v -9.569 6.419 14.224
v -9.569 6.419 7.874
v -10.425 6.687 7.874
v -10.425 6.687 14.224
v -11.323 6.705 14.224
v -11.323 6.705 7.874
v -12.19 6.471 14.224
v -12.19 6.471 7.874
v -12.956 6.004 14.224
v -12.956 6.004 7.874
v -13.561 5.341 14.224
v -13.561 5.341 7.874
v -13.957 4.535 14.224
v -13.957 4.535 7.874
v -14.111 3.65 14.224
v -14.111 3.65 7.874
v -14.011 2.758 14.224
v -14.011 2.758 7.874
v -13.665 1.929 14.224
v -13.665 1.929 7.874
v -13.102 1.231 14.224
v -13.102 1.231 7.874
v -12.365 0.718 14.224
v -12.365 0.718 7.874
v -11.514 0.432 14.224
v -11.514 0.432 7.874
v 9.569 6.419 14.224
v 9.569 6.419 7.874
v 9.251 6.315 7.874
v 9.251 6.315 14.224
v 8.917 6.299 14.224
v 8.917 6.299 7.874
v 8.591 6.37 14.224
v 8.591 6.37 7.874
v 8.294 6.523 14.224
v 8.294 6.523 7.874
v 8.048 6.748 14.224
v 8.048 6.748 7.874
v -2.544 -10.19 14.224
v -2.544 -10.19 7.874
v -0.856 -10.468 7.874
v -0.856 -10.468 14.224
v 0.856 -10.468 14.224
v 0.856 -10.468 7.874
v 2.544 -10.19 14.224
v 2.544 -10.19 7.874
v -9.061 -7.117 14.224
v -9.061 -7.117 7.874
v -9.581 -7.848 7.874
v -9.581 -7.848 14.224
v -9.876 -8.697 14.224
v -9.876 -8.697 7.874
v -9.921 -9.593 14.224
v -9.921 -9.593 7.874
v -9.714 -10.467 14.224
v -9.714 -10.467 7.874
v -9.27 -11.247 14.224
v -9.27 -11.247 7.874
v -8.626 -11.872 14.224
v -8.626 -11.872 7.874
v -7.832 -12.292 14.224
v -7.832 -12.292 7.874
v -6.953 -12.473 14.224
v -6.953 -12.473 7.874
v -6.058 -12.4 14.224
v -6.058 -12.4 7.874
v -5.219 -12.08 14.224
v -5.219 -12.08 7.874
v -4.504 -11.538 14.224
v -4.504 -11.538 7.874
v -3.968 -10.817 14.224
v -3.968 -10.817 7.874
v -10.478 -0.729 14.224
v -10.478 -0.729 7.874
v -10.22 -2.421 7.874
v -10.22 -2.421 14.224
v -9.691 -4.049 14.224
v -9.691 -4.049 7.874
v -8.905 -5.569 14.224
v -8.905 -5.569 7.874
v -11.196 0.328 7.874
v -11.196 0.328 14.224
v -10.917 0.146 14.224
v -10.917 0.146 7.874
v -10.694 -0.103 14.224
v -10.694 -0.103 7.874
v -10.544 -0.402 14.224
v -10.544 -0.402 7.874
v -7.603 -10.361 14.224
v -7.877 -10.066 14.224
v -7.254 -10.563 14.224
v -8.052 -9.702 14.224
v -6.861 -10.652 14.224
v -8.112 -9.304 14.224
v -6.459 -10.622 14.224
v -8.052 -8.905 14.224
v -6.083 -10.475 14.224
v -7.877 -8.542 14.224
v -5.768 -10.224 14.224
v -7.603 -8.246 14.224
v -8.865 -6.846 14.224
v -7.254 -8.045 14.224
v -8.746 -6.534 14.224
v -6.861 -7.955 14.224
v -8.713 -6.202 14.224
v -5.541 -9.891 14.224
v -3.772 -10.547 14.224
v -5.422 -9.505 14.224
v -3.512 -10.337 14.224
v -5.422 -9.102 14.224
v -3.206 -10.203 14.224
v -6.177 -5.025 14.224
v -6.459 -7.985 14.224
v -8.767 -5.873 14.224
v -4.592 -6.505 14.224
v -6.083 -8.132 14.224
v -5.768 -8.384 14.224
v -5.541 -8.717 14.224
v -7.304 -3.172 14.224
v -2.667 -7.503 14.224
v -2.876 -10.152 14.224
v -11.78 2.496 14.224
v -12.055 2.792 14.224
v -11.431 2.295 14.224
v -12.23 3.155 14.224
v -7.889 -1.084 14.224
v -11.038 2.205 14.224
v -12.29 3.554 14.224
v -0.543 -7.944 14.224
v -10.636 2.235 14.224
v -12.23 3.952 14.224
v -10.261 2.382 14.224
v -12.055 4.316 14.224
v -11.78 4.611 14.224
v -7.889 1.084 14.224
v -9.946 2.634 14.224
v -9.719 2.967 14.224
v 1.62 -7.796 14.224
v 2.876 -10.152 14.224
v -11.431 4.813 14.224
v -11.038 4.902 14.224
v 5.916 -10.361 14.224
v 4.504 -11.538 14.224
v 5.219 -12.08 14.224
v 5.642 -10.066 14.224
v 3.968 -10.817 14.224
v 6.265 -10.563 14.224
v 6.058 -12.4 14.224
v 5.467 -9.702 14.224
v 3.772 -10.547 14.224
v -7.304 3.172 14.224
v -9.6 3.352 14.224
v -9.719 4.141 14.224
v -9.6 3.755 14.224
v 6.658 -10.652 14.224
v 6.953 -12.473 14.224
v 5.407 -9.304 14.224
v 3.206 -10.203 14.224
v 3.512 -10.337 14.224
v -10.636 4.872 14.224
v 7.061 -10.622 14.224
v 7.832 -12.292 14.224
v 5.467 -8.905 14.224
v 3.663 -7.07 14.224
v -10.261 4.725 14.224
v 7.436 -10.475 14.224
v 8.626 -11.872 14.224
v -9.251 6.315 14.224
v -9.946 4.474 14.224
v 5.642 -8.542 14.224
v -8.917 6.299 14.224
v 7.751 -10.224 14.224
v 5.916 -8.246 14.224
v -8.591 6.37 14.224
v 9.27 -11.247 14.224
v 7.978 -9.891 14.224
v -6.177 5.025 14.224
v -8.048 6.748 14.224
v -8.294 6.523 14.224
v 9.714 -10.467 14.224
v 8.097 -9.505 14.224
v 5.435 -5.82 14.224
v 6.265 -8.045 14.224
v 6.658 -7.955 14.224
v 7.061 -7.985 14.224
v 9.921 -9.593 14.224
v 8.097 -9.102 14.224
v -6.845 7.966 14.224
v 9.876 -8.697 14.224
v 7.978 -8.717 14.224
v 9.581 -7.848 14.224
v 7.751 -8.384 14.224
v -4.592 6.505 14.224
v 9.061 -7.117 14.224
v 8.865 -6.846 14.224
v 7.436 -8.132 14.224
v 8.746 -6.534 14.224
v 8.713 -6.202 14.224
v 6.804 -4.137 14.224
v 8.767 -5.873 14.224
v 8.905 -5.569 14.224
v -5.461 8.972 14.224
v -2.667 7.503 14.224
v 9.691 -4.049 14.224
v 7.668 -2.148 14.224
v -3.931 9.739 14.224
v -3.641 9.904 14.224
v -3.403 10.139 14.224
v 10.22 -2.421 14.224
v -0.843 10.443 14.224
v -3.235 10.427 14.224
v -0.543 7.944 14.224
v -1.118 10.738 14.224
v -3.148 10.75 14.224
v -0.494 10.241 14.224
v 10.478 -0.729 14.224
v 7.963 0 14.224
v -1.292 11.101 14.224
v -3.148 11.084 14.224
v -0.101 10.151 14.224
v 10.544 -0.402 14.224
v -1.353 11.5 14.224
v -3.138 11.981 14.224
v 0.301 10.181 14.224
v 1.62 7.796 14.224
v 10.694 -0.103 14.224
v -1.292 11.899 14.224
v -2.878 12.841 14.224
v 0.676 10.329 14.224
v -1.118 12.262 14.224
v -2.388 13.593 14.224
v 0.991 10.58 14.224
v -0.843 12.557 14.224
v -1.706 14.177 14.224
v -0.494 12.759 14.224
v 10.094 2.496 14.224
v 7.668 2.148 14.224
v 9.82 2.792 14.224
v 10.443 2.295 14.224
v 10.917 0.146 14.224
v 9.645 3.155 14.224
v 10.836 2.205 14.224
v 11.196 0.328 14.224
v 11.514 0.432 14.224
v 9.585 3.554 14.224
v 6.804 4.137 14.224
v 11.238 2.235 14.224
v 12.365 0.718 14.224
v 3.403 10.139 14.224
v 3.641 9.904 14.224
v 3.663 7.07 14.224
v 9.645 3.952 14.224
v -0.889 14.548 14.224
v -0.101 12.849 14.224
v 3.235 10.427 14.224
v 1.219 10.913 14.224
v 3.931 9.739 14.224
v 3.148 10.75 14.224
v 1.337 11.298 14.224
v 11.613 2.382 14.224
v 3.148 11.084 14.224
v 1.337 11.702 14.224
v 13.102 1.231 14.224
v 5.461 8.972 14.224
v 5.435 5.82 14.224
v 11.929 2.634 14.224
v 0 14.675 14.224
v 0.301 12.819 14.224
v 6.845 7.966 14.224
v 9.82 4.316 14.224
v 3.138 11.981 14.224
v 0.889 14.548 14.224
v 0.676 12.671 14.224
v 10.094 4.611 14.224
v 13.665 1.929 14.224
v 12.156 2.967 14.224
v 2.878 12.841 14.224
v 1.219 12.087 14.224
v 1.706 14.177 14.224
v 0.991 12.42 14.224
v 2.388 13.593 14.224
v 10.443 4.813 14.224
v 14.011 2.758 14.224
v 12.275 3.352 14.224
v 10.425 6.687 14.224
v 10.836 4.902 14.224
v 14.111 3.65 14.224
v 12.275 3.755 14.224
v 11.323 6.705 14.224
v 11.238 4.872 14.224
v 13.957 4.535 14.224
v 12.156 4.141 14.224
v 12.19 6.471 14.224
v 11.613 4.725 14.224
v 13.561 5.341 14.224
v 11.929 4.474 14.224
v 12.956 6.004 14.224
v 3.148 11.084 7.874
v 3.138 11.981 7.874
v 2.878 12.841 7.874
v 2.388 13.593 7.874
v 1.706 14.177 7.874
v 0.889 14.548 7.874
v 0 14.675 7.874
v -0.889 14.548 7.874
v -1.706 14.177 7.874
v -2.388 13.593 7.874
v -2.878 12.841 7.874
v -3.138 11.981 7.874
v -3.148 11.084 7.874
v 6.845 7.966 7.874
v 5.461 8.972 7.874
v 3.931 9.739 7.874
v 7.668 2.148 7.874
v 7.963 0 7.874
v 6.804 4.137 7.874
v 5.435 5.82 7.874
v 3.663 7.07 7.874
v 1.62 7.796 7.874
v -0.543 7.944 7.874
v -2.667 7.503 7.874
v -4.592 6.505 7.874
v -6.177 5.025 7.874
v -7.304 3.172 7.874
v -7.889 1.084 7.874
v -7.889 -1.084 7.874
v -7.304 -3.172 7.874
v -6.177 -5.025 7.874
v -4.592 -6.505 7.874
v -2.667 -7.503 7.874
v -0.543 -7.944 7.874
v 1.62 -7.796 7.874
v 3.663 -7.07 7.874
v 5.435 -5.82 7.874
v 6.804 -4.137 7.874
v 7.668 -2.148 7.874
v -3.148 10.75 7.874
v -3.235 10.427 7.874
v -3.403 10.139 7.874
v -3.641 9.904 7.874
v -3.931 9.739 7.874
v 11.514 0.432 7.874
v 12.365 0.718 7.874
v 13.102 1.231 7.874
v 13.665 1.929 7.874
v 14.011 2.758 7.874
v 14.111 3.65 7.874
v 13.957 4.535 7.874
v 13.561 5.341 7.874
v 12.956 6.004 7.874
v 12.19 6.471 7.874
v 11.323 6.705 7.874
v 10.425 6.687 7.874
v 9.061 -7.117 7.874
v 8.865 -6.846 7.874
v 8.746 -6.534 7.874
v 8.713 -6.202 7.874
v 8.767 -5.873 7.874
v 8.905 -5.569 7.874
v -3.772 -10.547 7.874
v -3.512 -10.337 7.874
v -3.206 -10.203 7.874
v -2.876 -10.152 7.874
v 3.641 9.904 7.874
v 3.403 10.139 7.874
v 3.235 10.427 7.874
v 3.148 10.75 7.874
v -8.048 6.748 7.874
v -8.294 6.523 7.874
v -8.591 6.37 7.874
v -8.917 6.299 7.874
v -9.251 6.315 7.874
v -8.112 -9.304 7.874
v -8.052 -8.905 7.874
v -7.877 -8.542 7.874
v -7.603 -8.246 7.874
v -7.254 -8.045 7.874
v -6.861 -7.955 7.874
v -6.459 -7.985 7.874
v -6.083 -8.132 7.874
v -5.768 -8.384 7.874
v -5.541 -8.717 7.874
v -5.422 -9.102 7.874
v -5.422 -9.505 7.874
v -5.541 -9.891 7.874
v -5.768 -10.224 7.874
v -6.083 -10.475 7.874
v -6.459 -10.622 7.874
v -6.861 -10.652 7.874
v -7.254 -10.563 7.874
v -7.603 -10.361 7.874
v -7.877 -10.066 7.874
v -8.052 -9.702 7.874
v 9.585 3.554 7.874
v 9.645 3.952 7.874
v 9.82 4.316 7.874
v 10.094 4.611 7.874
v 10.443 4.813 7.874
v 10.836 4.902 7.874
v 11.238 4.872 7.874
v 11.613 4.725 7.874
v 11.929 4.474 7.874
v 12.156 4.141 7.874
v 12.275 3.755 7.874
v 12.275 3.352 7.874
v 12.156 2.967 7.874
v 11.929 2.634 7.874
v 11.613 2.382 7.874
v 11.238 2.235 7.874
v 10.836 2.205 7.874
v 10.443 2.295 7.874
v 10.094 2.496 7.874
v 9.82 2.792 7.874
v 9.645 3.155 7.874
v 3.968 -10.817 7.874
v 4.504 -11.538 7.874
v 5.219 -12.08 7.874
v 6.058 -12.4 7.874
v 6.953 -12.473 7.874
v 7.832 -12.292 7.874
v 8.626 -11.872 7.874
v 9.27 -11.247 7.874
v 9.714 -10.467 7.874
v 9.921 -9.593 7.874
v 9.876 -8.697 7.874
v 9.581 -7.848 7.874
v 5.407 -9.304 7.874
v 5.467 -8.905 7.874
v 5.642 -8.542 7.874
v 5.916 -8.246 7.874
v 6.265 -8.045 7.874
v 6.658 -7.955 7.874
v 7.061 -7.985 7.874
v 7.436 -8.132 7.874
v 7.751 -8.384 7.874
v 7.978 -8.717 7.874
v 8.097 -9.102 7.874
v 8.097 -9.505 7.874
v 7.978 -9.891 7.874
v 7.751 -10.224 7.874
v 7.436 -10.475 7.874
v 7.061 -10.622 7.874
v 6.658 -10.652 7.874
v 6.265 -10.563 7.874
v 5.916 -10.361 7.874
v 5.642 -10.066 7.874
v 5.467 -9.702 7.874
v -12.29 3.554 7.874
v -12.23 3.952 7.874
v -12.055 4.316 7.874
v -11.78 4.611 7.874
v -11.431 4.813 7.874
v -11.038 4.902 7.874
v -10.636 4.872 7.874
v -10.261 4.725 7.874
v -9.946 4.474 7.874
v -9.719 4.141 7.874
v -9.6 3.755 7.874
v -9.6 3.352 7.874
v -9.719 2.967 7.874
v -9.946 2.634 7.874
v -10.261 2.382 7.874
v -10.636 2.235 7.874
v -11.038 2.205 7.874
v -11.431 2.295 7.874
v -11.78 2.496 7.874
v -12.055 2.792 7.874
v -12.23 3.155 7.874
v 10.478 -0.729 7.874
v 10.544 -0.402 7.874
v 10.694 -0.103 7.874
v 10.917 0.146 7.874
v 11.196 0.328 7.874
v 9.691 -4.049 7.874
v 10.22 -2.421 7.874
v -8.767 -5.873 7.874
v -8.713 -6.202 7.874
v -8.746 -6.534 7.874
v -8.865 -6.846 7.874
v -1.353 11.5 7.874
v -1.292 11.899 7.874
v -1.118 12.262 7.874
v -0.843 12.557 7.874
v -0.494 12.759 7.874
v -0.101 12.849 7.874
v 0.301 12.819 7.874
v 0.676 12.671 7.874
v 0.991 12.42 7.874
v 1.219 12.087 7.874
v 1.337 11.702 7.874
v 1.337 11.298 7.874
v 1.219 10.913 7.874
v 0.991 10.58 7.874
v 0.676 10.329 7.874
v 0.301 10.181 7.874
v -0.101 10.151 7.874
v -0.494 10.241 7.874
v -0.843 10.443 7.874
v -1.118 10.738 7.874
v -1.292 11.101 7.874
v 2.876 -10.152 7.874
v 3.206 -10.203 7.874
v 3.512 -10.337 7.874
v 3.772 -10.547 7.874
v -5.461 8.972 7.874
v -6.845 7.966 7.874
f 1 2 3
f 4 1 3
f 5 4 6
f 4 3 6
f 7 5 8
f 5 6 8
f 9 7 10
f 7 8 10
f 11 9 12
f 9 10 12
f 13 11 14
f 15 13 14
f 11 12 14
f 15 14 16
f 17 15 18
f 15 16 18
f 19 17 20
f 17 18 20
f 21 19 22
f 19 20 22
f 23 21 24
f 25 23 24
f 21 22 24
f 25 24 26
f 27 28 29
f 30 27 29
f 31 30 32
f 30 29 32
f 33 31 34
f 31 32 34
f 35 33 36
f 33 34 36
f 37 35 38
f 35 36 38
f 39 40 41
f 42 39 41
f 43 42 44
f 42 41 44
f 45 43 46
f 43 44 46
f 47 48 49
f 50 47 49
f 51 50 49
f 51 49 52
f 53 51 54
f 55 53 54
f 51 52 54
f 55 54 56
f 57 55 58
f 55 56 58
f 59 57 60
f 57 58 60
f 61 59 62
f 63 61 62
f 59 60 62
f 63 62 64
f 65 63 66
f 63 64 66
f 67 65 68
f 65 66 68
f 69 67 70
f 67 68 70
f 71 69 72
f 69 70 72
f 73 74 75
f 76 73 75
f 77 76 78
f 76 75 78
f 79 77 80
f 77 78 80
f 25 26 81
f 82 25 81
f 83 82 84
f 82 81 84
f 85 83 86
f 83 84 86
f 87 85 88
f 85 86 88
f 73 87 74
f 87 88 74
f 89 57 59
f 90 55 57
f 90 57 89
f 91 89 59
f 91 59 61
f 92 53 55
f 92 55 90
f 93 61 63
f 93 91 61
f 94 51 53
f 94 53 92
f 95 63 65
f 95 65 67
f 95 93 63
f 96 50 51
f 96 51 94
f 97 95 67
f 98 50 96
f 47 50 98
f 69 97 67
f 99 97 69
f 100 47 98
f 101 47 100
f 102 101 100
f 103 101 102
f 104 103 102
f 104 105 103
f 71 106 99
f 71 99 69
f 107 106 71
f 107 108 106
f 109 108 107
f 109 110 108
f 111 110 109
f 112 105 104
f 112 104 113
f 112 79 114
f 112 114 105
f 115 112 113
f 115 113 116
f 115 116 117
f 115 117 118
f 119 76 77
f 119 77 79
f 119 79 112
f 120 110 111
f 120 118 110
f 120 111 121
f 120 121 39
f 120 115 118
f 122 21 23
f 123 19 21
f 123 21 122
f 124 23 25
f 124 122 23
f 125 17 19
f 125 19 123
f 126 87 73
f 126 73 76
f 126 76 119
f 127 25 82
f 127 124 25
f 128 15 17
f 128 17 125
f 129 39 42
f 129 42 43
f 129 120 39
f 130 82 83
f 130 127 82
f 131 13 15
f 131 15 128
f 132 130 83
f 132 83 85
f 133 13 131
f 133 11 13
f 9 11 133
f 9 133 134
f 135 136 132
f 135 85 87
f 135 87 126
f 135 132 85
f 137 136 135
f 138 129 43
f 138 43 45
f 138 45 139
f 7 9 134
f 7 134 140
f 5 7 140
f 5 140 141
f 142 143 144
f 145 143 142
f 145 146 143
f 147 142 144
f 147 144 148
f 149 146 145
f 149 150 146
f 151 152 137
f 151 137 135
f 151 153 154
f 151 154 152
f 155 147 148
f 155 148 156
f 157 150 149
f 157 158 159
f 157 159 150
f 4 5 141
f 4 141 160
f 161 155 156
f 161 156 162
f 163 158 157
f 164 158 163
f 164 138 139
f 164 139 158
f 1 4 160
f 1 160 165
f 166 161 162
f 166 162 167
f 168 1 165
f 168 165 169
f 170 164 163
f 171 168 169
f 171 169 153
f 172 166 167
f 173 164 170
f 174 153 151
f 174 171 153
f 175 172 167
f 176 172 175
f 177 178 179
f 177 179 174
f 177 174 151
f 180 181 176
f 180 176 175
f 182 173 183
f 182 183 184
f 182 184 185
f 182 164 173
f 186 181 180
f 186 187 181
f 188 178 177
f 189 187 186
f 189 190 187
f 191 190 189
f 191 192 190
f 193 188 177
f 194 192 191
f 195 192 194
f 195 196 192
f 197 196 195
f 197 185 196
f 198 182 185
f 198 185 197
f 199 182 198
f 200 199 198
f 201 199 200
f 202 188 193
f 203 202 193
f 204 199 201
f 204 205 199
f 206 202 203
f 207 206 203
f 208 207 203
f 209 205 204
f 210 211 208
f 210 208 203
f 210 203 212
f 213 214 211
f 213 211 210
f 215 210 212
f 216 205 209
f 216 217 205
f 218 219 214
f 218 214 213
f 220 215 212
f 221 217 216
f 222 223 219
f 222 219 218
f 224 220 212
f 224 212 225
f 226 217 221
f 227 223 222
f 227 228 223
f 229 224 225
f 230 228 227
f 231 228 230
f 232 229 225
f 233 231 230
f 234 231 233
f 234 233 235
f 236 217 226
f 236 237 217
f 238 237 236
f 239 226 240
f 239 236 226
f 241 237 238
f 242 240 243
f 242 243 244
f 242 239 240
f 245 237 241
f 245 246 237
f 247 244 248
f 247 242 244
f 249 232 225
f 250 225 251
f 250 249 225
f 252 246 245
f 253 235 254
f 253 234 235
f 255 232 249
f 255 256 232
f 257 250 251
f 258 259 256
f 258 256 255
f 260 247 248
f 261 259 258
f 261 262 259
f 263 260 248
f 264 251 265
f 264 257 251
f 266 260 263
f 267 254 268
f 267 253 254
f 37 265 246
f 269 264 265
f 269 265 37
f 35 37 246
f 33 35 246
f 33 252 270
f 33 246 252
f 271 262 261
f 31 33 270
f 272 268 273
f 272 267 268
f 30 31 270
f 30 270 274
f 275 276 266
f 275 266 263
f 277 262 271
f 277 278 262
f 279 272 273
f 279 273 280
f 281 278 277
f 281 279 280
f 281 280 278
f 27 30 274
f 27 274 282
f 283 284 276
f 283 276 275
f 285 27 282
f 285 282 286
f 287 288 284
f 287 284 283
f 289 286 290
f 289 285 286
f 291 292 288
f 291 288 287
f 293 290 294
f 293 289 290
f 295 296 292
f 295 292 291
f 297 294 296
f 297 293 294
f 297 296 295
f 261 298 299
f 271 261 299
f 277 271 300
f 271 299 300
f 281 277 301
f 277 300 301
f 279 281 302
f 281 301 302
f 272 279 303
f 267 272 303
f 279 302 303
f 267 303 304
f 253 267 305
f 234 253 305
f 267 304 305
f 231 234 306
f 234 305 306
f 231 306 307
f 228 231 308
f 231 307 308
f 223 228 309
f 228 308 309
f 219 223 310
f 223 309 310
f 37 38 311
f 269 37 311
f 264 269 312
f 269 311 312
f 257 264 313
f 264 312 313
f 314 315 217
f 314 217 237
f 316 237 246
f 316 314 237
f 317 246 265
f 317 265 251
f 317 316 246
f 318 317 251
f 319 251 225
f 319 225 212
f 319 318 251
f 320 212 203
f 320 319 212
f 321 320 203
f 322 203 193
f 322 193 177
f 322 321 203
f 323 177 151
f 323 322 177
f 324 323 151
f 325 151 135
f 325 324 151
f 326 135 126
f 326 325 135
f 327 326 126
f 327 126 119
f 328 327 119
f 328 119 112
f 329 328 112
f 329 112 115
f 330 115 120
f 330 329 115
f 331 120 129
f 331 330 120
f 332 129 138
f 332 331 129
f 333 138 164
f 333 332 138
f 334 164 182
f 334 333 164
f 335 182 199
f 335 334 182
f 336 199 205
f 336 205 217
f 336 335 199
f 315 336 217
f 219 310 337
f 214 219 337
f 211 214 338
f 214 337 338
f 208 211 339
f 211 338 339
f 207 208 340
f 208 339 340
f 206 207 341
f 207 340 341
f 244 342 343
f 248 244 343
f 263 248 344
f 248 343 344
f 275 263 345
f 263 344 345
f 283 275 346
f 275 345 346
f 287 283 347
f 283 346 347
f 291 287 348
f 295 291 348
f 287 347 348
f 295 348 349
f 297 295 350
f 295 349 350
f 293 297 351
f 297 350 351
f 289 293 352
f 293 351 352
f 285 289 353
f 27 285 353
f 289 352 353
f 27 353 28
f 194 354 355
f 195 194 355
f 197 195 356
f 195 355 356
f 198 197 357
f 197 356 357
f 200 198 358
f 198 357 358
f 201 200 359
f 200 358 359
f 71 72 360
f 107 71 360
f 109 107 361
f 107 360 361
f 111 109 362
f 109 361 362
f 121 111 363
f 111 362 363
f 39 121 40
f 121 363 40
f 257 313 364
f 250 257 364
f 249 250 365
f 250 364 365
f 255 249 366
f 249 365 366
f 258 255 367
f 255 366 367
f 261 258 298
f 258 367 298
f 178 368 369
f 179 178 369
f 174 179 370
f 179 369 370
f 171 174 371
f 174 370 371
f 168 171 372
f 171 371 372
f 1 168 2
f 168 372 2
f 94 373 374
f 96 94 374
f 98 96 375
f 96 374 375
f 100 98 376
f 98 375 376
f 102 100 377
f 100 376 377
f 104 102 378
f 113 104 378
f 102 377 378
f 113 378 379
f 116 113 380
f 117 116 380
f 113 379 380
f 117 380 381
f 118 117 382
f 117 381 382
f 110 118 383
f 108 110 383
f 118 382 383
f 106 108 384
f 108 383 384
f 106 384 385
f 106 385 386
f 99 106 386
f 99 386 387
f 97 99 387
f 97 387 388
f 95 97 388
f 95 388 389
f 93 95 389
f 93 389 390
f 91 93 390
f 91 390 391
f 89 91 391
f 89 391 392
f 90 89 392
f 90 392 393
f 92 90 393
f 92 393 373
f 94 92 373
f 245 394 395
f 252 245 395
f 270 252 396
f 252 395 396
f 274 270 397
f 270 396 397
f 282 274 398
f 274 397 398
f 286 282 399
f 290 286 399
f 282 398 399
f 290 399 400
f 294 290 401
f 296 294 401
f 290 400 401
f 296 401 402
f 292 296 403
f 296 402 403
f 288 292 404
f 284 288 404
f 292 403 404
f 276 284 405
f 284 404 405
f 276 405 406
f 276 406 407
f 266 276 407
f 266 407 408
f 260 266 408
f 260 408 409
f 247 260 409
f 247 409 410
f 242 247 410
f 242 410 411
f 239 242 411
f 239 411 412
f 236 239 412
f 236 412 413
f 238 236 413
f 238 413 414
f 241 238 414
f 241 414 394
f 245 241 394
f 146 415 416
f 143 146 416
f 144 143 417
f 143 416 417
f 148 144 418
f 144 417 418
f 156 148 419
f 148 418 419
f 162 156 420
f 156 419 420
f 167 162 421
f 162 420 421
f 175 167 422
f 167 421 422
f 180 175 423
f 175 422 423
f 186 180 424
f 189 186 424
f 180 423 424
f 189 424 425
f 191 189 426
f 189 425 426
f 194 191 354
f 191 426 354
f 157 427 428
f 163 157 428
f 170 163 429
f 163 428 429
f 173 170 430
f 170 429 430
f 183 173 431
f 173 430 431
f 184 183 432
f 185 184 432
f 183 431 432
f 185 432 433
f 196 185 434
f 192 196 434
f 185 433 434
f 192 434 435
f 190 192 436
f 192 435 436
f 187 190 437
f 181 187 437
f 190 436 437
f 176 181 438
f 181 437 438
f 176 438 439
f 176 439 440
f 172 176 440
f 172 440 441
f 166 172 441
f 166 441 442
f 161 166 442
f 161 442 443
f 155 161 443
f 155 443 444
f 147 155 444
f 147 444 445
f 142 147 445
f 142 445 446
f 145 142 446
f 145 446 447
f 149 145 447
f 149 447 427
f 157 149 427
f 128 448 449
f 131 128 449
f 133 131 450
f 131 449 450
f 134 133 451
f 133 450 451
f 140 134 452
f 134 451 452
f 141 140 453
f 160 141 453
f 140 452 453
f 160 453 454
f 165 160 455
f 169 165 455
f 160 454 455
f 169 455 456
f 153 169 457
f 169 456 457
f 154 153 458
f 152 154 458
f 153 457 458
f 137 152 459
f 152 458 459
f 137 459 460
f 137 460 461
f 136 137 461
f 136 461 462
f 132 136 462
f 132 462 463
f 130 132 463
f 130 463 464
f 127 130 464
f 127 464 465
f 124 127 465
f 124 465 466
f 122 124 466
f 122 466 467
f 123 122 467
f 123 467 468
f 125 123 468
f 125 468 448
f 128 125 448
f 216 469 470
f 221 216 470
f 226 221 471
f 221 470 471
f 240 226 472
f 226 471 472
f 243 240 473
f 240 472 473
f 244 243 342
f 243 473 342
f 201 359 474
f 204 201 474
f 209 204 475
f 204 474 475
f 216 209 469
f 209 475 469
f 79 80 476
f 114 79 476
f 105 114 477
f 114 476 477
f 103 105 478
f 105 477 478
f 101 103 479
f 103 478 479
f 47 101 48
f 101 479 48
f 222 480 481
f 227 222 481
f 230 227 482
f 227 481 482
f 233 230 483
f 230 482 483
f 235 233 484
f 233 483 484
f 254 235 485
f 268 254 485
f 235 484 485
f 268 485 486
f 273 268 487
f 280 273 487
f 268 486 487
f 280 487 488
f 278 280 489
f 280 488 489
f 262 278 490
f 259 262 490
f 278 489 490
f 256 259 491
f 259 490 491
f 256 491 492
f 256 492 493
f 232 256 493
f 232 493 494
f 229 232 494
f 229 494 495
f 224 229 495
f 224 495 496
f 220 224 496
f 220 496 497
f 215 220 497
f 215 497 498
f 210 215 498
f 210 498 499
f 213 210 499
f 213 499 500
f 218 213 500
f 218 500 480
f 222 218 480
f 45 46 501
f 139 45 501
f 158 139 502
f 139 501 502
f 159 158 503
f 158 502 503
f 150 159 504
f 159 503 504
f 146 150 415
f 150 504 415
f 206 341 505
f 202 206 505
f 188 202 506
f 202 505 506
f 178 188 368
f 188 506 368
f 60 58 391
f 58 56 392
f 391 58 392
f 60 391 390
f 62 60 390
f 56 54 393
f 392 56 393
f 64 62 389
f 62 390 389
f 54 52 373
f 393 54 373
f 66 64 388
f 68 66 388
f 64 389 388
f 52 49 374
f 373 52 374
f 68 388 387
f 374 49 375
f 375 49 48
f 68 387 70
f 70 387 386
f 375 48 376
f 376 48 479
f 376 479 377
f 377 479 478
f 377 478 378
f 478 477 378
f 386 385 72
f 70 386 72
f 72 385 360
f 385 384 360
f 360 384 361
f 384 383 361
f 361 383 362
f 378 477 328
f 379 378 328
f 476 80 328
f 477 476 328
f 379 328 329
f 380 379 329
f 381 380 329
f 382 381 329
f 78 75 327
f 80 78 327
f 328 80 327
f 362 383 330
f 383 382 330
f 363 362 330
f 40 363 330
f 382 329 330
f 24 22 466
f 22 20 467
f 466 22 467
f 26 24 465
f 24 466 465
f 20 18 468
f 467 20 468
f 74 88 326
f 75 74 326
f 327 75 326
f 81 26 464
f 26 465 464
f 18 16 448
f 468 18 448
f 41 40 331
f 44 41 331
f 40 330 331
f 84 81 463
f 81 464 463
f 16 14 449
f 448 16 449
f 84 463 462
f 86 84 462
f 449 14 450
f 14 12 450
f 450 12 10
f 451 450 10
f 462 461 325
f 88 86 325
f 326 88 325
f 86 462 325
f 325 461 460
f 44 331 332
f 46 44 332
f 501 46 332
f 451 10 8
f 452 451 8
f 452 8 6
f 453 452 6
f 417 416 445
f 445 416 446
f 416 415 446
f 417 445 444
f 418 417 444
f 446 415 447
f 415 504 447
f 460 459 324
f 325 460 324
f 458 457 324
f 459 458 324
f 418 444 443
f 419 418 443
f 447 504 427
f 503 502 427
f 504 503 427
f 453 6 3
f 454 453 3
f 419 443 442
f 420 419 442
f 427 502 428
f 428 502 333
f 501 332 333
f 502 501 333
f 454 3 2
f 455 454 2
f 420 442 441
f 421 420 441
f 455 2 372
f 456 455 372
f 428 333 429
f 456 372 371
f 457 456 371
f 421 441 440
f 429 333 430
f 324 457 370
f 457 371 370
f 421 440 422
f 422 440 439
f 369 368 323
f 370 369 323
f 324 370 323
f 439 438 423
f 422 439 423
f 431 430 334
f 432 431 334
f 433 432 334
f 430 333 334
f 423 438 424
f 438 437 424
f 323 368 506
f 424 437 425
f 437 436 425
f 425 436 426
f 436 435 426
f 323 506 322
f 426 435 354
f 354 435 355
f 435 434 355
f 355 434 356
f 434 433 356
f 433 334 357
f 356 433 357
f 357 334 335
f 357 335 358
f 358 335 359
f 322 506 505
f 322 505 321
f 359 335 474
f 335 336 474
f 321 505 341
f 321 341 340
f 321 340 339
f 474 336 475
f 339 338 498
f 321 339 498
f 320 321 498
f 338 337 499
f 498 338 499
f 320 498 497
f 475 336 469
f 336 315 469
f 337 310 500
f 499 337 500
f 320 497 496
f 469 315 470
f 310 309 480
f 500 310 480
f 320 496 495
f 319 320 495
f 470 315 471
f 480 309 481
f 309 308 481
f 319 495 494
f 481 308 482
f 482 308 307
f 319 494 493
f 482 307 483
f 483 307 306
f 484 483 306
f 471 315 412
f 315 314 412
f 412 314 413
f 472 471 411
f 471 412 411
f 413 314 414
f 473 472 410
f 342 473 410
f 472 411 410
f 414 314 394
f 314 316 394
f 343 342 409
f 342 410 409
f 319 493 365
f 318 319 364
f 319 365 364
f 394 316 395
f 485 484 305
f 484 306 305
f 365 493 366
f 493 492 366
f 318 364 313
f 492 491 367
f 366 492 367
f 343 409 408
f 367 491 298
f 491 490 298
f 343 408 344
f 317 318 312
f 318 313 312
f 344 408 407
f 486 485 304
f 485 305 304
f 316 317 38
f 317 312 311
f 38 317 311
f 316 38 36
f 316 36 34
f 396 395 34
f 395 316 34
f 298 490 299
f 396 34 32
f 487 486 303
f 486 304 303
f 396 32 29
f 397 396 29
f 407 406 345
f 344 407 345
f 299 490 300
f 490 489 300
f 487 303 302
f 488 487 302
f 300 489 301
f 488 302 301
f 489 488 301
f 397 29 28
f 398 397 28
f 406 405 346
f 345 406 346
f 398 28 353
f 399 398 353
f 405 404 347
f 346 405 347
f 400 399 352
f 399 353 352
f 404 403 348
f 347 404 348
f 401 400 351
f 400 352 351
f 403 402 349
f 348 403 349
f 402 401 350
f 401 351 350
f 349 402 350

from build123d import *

# Parameters (mm, degrees)
SKETCH1_R             = 7.9629
BOSS_EXTRUDE1_DEPTH   = 6.35
F_6_32_TAPPED_HOLE1_D = 2.7051


with BuildPart() as part:
    # Sketch1 → Boss-Extrude1 (new body)
    with BuildSketch(Plane.XY.offset(7.874)):
        with BuildLine():
            ThreePointArc((8.047909304, 6.74848607), (6.173449726, 8.49702459), (3.931250908, 9.739413469))
            ThreePointArc((3.931250908, 9.739413469), (3.309450684, 10.277458281), (3.147581267, 11.08363818))
            ThreePointArc((3.147581267, 11.08363818), (0, 14.675), (-3.147581267, 11.08363818))
            ThreePointArc((-3.147581267, 11.08363818), (-3.309450684, 10.277458281), (-3.931250908, 9.739413469))
            ThreePointArc((-3.931250908, 9.739413469), (-6.173449726, 8.49702459), (-8.047909304, 6.74848607))
            ThreePointArc((-8.047909304, 6.74848607), (-8.751767166, 6.323383906), (-9.568510213, 6.418560232))
            ThreePointArc((-9.568510213, 6.418560232), (-13.956754377, 4.534824392), (-11.513822419, 0.431504882))
            ThreePointArc((-11.513822419, 0.431504882), (-10.797120172, 0.028434629), (-10.477555984, -0.729197516))
            ThreePointArc((-10.477555984, -0.729197516), (-9.988851485, -3.24557459), (-8.905132396, -5.568619705))
            ThreePointArc((-8.905132396, -5.568619705), (-8.718340254, -6.369392103), (-9.061245801, -7.116749798))
            ThreePointArc((-9.061245801, -7.116749798), (-8.625748577, -11.872324392), (-3.968352328, -10.816953497))
            ThreePointArc((-3.968352328, -10.816953497), (-3.363536563, -10.259884713), (-2.544234809, -10.190082318))
            ThreePointArc((-2.544234809, -10.190082318), (0, -10.5029), (2.544234809, -10.190082318))
            ThreePointArc((2.544234809, -10.190082318), (3.363536563, -10.259884713), (3.968352328, -10.816953497))
            ThreePointArc((3.968352328, -10.816953497), (8.625748577, -11.872324392), (9.061245801, -7.116749798))
            ThreePointArc((9.061245801, -7.116749798), (8.718340254, -6.369392103), (8.905132396, -5.568619705))
            ThreePointArc((8.905132396, -5.568619705), (9.988851485, -3.24557459), (10.477555984, -0.729197516))
            ThreePointArc((10.477555984, -0.729197516), (10.797120172, 0.028434629), (11.513822419, 0.431504882))
            ThreePointArc((11.513822419, 0.431504882), (13.956754377, 4.534824392), (9.568510213, 6.418560232))
            ThreePointArc((9.568510213, 6.418560232), (8.751767166, 6.323383906), (8.047909304, 6.74848607))
        make_face()
        Circle(SKETCH1_R, mode=Mode.SUBTRACT)
    extrude(amount=BOSS_EXTRUDE1_DEPTH)

    # #6-32 Tapped Hole1 (through all)
    with Locations(Plane.XY.offset(14.224)):
        with Locations((-10.937149937, 3.553695435), (0, 11.5), (10.937149937, 3.553695435), (6.759530401, -9.303695435), (-6.759530401, -9.303695435)):
            Hole(F_6_32_TAPPED_HOLE1_D / 2)


solid = part.part
